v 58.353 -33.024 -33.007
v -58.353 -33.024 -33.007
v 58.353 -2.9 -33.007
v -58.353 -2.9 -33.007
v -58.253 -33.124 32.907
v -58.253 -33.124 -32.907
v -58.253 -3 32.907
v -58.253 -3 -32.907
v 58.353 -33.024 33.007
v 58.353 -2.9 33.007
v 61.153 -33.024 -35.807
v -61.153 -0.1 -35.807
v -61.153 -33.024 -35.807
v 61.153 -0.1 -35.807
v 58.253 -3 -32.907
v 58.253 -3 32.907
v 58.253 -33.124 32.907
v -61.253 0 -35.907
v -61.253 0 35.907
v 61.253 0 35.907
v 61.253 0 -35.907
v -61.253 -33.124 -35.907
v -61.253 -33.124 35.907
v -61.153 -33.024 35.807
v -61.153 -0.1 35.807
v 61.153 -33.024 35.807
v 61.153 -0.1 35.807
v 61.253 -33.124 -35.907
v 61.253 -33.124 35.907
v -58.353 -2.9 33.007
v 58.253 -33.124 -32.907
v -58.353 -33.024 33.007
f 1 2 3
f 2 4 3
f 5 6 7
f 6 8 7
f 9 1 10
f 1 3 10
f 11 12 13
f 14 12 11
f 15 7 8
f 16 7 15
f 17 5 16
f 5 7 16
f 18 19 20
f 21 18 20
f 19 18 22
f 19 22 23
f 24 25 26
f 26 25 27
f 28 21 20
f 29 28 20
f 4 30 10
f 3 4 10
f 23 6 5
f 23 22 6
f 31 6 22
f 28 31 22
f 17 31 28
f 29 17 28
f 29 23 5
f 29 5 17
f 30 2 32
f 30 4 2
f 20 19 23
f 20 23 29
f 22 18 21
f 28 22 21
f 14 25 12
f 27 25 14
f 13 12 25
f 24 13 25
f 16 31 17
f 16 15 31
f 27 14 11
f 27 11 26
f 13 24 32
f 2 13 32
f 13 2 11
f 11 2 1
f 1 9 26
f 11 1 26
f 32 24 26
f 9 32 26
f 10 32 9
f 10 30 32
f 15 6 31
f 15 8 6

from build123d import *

# Parameters (mm, degrees)
F0_W     = 122.5050538778
F0_H     = 71.8133747578
F1_DEPTH = 33.1241749227
F2_T     = -3
F3_T     = -0.1


with BuildPart() as f1:
    # F0 (on Front) → F1 (new body)
    with BuildSketch(Plane.XZ):
        Rectangle(F0_W, F0_H)
    extrude(amount=F1_DEPTH)

    # F2
    f2_openings = [f1.faces().sort_by_distance(p)[0] for p in [
        (0, -33.124175, 0),
    ]]
    offset(amount=F2_T, openings=f2_openings)

    # F3 (hollow: no face is removed)
    offset(amount=F3_T, kind=Kind.INTERSECTION, mode=Mode.SUBTRACT)


solid = f1.part
